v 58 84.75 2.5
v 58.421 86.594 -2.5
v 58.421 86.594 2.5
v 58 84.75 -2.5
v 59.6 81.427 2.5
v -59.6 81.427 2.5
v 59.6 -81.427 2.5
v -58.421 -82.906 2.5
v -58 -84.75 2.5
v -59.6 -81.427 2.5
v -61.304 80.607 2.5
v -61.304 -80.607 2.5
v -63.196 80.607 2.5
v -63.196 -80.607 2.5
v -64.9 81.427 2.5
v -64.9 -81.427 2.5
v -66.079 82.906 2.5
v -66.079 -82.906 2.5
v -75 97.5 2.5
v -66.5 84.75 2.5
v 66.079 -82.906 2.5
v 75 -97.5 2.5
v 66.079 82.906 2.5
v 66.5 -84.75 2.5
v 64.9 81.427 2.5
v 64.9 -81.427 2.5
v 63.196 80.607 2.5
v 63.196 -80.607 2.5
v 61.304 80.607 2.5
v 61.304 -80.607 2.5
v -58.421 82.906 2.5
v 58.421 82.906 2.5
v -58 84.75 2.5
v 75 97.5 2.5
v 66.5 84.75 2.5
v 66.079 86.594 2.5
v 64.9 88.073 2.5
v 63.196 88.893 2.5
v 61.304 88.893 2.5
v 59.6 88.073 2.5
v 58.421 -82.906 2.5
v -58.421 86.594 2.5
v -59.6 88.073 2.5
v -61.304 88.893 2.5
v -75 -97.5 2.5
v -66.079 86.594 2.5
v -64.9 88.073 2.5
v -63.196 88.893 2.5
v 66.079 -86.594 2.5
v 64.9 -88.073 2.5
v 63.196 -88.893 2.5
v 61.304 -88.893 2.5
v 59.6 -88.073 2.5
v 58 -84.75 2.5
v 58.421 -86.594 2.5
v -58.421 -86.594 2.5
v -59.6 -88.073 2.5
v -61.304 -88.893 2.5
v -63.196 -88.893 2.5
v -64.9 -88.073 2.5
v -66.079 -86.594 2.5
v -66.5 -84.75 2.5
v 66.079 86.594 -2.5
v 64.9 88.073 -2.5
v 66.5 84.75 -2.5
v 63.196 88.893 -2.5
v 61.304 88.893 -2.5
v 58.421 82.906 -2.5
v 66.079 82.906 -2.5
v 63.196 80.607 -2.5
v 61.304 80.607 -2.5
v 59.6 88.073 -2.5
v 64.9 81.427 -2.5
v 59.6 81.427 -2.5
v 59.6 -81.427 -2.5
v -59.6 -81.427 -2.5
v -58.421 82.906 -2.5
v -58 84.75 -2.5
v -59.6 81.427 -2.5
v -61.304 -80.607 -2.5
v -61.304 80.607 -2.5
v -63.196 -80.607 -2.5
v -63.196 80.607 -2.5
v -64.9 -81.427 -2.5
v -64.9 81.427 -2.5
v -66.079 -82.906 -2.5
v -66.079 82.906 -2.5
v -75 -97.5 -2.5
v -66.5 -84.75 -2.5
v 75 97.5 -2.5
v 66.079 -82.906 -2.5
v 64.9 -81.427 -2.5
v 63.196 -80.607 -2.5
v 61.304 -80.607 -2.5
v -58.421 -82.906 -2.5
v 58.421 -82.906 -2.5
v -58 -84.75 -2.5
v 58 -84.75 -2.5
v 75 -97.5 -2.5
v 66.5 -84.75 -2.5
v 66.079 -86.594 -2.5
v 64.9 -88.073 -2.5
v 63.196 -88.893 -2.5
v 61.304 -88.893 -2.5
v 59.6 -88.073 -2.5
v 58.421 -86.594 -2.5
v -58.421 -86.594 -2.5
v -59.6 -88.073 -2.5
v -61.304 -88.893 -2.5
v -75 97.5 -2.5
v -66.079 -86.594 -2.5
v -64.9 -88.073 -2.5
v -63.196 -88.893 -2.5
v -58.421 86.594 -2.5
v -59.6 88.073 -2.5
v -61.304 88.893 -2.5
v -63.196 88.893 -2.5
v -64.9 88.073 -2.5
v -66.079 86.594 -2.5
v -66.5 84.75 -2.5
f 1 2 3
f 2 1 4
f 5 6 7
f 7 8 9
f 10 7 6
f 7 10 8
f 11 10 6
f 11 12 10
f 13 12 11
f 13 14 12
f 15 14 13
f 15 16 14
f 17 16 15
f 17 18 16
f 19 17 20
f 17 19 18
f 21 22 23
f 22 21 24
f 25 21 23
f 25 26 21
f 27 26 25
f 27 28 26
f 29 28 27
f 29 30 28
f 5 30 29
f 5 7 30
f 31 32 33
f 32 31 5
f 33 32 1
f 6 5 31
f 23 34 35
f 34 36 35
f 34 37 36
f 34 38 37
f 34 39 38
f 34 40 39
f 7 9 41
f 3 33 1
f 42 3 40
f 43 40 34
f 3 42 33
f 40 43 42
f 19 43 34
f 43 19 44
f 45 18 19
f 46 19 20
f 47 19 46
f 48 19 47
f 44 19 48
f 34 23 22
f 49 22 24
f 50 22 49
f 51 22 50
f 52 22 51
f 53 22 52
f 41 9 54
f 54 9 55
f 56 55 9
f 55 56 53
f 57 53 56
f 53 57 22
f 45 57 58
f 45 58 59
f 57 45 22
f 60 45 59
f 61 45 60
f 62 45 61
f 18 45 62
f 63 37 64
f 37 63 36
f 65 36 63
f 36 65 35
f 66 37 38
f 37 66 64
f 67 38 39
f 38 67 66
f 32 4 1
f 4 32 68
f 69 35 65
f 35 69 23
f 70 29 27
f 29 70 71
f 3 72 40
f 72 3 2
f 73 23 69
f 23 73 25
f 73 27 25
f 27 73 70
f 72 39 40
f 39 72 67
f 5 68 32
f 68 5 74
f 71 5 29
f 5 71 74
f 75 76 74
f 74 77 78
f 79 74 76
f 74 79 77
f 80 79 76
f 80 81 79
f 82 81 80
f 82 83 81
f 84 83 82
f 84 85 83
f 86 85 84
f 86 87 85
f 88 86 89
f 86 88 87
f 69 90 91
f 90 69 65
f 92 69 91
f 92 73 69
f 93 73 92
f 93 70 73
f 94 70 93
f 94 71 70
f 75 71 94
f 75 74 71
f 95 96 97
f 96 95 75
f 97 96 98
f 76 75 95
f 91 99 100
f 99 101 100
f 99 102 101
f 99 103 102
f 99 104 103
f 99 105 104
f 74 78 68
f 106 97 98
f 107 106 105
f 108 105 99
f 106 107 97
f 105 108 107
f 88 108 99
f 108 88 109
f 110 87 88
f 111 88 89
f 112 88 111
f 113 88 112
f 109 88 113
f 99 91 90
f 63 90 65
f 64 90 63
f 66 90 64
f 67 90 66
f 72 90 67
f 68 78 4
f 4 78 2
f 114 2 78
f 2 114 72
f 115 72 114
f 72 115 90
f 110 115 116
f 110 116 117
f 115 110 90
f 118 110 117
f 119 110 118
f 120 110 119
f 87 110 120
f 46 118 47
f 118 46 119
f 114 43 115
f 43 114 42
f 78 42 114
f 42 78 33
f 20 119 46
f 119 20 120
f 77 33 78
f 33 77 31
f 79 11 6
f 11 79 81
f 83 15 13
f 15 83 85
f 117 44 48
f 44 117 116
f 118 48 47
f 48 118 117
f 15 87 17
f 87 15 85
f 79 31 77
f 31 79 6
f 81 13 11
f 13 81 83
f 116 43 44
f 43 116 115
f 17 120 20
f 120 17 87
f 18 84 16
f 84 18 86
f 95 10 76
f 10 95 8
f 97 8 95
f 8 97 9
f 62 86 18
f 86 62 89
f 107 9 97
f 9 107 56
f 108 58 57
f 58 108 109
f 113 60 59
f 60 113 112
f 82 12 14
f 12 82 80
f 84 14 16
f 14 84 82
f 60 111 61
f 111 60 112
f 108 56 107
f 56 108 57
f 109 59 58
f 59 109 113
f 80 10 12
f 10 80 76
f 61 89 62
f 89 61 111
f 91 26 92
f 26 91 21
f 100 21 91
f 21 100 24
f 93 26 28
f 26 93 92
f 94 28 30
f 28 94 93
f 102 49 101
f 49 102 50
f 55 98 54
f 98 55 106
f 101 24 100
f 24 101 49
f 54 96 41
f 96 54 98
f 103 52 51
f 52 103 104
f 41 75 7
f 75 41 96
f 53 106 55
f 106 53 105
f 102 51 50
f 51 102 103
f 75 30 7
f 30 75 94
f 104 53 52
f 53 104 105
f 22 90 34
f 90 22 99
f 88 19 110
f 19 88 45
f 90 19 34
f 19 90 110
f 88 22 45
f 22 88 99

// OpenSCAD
// Generated by SolidPython 1.1.3 on 2024-01-11 20:37:03


difference() {
	cube(center = true, size = [150, 195.0000000000, 5]);
	union() {
		translate(v = [62.2500000000, 84.7500000000]) {
			cylinder(center = true, h = 5, r = 4.2500000000);
		}
		translate(v = [-62.2500000000, 84.7500000000]) {
			cylinder(center = true, h = 5, r = 4.2500000000);
		}
		translate(v = [-62.2500000000, -84.7500000000]) {
			cylinder(center = true, h = 5, r = 4.2500000000);
		}
		translate(v = [62.2500000000, -84.7500000000]) {
			cylinder(center = true, h = 5, r = 4.2500000000);
		}
	}
}
/***********************************************
*********      SolidPython code:      **********
************************************************
 
import solid
import numpy as np
import numbers
import pudb
from solid.utils import *
import viewscad
import subprocess
import os
import os.path as osp
import math
import sys

chamfer_extrude=solid.import_scad("./chamfer_extrude.scad")
chamfer_extrude=chamfer_extrude.chamfer_extrude
r = viewscad.Renderer(width=800, height=800)

def debug(model,f_name,path="/home/ts/code/projects/mfd/designs/debug"):
    solid.scad_render_to_file(model,osp.join(path,f_name)+".scad")
#generate position list of wells using offset from center
wells_pos_from_center_4 = lambda offset: [[-offset,offset],
                                        [offset, offset],
                                        [-offset, -offset],
                                        [offset, -offset]]
wells_pos_from_center_2 = lambda offset: [[offset,0],
                                        [-offset,0]]

def make_well(dims,shape=None,height=None,dxf=False):
    def circle_cylinder():
        if dxf or (height is None):
            well = solid.circle(r=dims, segments=64)
        else:
            well = solid.cylinder(r=dims, h=height, segments=64, center = True)
        return well
    if dims is None:
        sys.exit("radius needs to be a number")
    if isinstance(dims, numbers.Number):
        well =circle_cylinder()
    elif len(dims)==1:
        if isinstance(dims[1], numbers.Number):
            well =circle_cylinder()
        else:
            sys.exit("radius needs to be a number")
    elif len(dims)==2:
        well = solid.square(dims,center = True)
    elif len(dims)==3:
        well = solid.cube(dims, center = True)
    return well

def wells_top_bottom(center_gap,device_dims=None,shape=None,height=None, positions = None, dxf = False,well_shape=None):
    if well_shape == None:
        well_shape = make_well(device_dims,shape=shape,height=height,dxf=dxf)
    wells = []
    if positions is None:
        offset = radius+radius/2.0
        positions = wells_pos_from_center_2(offset)
    if dxf or (height is None):
        height = 0
    for position in positions:
        if dxf:
            wells.append(solid.translate([position[0],position[1]])(well_shape))
        else:
            wells.append(solid.translate([position[0],position[1],height/2.0])(well_shape))
    return  union()(*wells)

#place wells in four corners 
def four_corner(radius,height=None, positions = None, dxf = False):
    #if well pos not specified set
    #to equally spaced by half radius
    if positions is None:
        offset = radius+radius/2.0
        positions = wells_pos_from_center_4(offset)
    if dxf or (height is None):
        height = 0
    #make wells at positions with specified radius and height
    wells = []
    for position in positions:
        #make circle if making dxf
        if dxf:
            well_shape = solid.circle(r=radius, segments=64)
            well_shape = solid.translate([position[0],position[1]])(well_shape)
        #if stl make cylinder
        else:
            well_shape = solid.cylinder(r=radius, h=height, segments=64, center = True)
            well_shape = solid.translate([position[0],position[1],height/2.0])(well_shape)
        wells.append(well_shape)
    return  union()(*wells)

#generate channels 
def make_channels(length,width,height=0,num_chans=1,max_chans=None,spacing=None, dxf = False,
                  rotate_channels=False):
    if dxf or (height is None):
        height = 0
    #if channel gap not defined, is equal to
    if spacing is None: spacing = width
    #calculate number of channels if fitting max num within given width
    if not max_chans is None:
        import math
        num_chans = math.floor((max_chans-spacing)/(width+spacing))
    #get total width of channel section  
    total_width = (width*num_chans)+(spacing*(num_chans-1))

    #make template channel
    #if rotate_channels: width, length = length, width
    if dxf:
        channel_t = solid.square([length,width],center = True)
    else:
        channel_t = solid.cube([length,width,height], center = True)

    #if number channels is even, offset the first channel to center its gap
    if num_chans % 2 == 0: centering = -(width/2.0+spacing/2.0)
    else: centering = 0
    #move template channel up to align bottom at z = 0 
    #and offset center if necessary
    if dxf:
        channel_t = solid.translate([0,centering])(channel_t)
    else:
        channel_t = solid.translate([0,centering,height/2.0])(channel_t)

    #if rotate_channels: length,width = width,length
    #start making the channels
    channels = []
    for i in range(num_chans):
        #if i=0 there is no translation
        #if i=1, we make the first channel adjacent to second
        direction = i

        #if i>=1, we add channels alternating left and right
        if i >= 1:
            direction = -(i/2.0)
            if i % 2 == 1: direction = (-direction)+0.5
                
        #make channel at right position and add it to channel list
        translation_coords = [0,direction*(width+spacing)]
        #if rotate_channels: translation_coords = [direction*(width+spacing),0]
        if dxf:
            channel = solid.translate(translation_coords)(channel_t)
        else:
            channel = solid.translate([*translation_coords,0])(channel_t)
        channels.append(channel)
    
    #group all channels as one object
    channels = union()(*channels)
    #compute the x,y,z dimensions in order to pass as arguments 
    #for construction of other parts of device (such as the chambers)
    measurements = {'x':(length/2.0,-length/2.0),
                    'y':(total_width/2.0,-total_width/2.0)}
    if not dxf:
        measurements['z'] = (height,0)
    if rotate_channels:
        channels = solid.rotate(90)(channels)
        measurements['x'],measurements['y']=measurements['y'],measurements['x']
    return channels,measurements

def make_chambers(msrs,height=None,extra=0,len_until=None,width=None, dxf = False):
    #computes x,y,z length
    total = lambda x : abs(x[0]) + abs(x[1])
    
    #if specific height if specified
    #otherwise use same height as channels
    if dxf:
        pass
    elif not height is None:
        msrs['z'] = (height,0)
    else:
        msrs['z'] = (0,0)
        
    #make copy of measurements from channels to modify chamber dimensions 
    #and add length to chambers as specified
    chamber_dims = msrs.copy()
    #calculate length of chamber to reach specified offset
    if not len_until is None:
        chamber_len = len_until-(msrs['x'][0])
    #or add specified length to channel length (if not specified, adds 0)
    else:
        chamber_len = msrs['x'][0]+extra
    #set the chamber length based 
    chamber_dims['x'] = (chamber_len/2.0,-(chamber_len/2.0))
    #compute final dimensions of chamber
    if not width is None:
        chamber_dims['y'] = (width/2.0,-width/2.0)
    chamber_dims = [total(size) for size in chamber_dims.values()]
        
    #calculate chamber translation offset to place adjacent to channels
    chamber_trslt = msrs['x'][0]+(chamber_len/2.0)
    #compute chamber translation coordinates to align with channels
    #x = 1 moves chamber above channels
    #x = -1 moves chamber below channels
    if dxf:
        trslt = lambda x : [x*(chamber_trslt),0]
    else:
        trslt = lambda x : [x*(chamber_trslt),0,msrs['z'][0]/2.0]
    
    #function to make chamber at top or at bottom 
    if dxf:
        move = lambda x : solid.translate(trslt(x))(solid.square(chamber_dims, center = True) )
    else:
        move = lambda x : solid.translate(trslt(x))(solid.cube(chamber_dims,center = True))
    #make top and bottom chambers and return them as grouped
    top = move(1)
    bottom = move(-1)
    #chambers=solid.rotate(90)(solid.union()(top,bottom))
    chambers=(solid.union()(top,bottom))

    return chambers

#create alignment features 
def alignment_features(unit,dims,grid_size, mask_size = None, alignment = "hollow", units_from_center = (2.5,2.5), corner_len=None):
    width = grid_size[0]*dims[0]
    length = grid_size[1]*dims[1]
    if mask_size is None and corner_len is None:
        corner_len = (dims[0] + dims[1]) /2 / 8
    corner = lambda thickness_div : solid.union()( solid.square([corner_len,corner_len/thickness_div],center=False), solid.square([corner_len/thickness_div,corner_len],center=False) )
    
    def make_full(thickness_div):
        thickness = corner_len/thickness_div
        tr = solid.translate([0, 0, 0 ])(solid.rotate(180)(corner(thickness_div)))
        tr = solid.translate([thickness/2,thickness/2,0])(tr)
        bl = solid.translate([0, 0, 0 ])(solid.rotate(0)(corner(thickness_div)))
        bl = solid.translate([-thickness/2,-thickness/2,0])(bl)
        return solid.union()(tr,bl)
    
    def make_hollow(thickness_div):
        thickness = corner_len/(thickness_div/2)
        inner = make_full(thickness_div)
        outer = make_full(thickness_div/2)
        hollow = outer - inner 
        return hollow
    
    center = (width /2 , length/2)
    mask_pos = lambda x,y : (center[0] + x*(float(units_from_center[0])*dims[0]), center[1] + y*(float(units_from_center[1])*dims[1]))
    positions = []
    positions.append(mask_pos(1,0))
    positions.append(mask_pos(0,1))
    positions.append(mask_pos(-1,0))
    positions.append(mask_pos(0,-1))
    make_mask = lambda mtype : make_hollow(8) if mtype == "hollow" else make_full(8)
    masks = [ solid.translate([*position,0])(make_mask(alignment)) for position in positions]
    
    solid.scad_render_to_file(solid.union()(*masks),"./designs/open_chamber/masks.scad")
    #return unit - solid.union()(*masks)
    return solid.union()(*masks,unit)

def create_outline(thickness, array, dims, grid_size,):
    width = grid_size[0]*dims[0] + thickness *2
    length = grid_size[1]*dims[1] + thickness *2
    outer = solid.translate([-thickness, -thickness,0])(solid.square([width, length]))
    return outer-array

def create_wall(wall_thickness, outline_thickness, dims, grid_size, wall_height = 2000, dxf = False):
    inner_width = grid_size[0]*dims[0] + outline_thickness *2
    inner_length = grid_size[1]*dims[1] + outline_thickness *2
    outer_width = inner_width + wall_thickness * 2
    outer_length = inner_length + wall_thickness * 2
    outer_pos_x = -outline_thickness-wall_thickness
    outer_pos_y = -outline_thickness-wall_thickness
    inner_pos_x = -outline_thickness
    inner_pos_y = -outline_thickness
    if dxf:
        inner_wall = solid.translate([inner_pos_x,
                                      inner_pos_y,
                                      0])(solid.square([inner_width, inner_length]))
        outer_wall = solid.translate([outer_pos_x,
                                      outer_pos_y,
                                      0])(solid.square([outer_width, outer_length]))

        return outer_wall-inner_wall
    else:
        inner_wall = solid.translate([inner_pos_x,
                                      inner_pos_y,
                                      0])(solid.cube([inner_width, inner_length,wall_height]))
        outer_wall = solid.translate([outer_pos_x,
                                      outer_pos_y,
                                      0])(solid.cube([outer_width, outer_length,wall_height]))

        return outer_wall-inner_wall, {'wall_height': wall_height,
                                       'wall_thickness': wall_thickness,
                                       'inner_width':inner_width,
                                       'inner_length': inner_length,
                                       'outer_width': outer_width,
                                       'outer_length': outer_length,
                                       'outer_pos_x' : outer_pos_x,
                                       'outer_pos_y' : outer_pos_y,
                                       'inner_pos_x' : inner_pos_x,
                                       'inner_pos_y' : inner_pos_y}

def create_thicker_wall(wall_thickness, outer_wall_offset, wall_dims, dims, grid_size, height_start = .2, height_end=2, dxf = False):
    addon_wall,thicker_wall_dims = create_wall(wall_thickness, outer_wall_offset, dims, grid_size, wall_height=height_end-height_start, dxf = False)
    addon_wall = solid.translate([0,0,height_start])(addon_wall)

    thicker_wall_dims['wall_height'] = height_end
    thicker_wall_dims['wall_thickness'] = wall_dims['wall_thickness'] + wall_thickness
    return addon_wall, thicker_wall_dims
 
def add_lock_to_wall(wall,wall_dims,y_offset = 0,cut_ratio=0.7,L_length=3, gap_ratio=0.05, axis="x",width_ratio=1/2):
    # Makes L shape
    def make_L(max_length,length_thickness,max_width,width_thickness,height,y_offset):
        length = solid.cube([max_length,length_thickness,height])
        width = solid.cube([width_thickness,max_width,height])
        width = solid.translate([max_length-(width_thickness),0,0])(width)
        L = solid.union()(width,length)
        debug(L,"L")
        if axis == "x":
            L = solid.rotate(-90)(L)
            L = solid.translate([0,max_length,0])(L)
        else:
            L = solid.rotate(-180)(L)
            L = solid.translate([max_length,max_width,0])(L)
        return solid.translate([0,0,y_offset])(L)
    
    lock_length = L_length
    lock_width = wall_dims['wall_thickness']*width_ratio
    lock_length_thickness = lock_width/2
    lock_width_thickness = lock_width/2
    L_lock = make_L(lock_length,lock_length_thickness,lock_width,lock_width_thickness, wall_dims['wall_height']-y_offset, y_offset)
    
    margin_space = lock_length - lock_length*(1-gap_ratio)
    key_length = lock_length-margin_space
    key_length_thickness = lock_length_thickness-(margin_space*2)
    key_width = lock_width-(margin_space*2)
    key_width_thickness = lock_width_thickness-(margin_space*2)
    L_key = make_L(key_length,key_length_thickness,key_width,key_width_thickness, wall_dims['wall_height']-y_offset, y_offset)
    L_key = solid.translate([margin_space,margin_space,0])(L_key)
    L = solid.union()(L_lock,L_key)
    debug(L,"L")
    
    #Make cube to be used as negative to split frame in a half
    #Can choose if making left or right negative, specify ratio of split
    def make_negative(right,cut_ratio):
        if axis == "x":
            if right:
                length = wall_dims['outer_length']*(1-cut_ratio)
                pos_x = wall_dims['outer_pos_x']+(wall_dims['outer_length']*cut_ratio)
            else:
                length = wall_dims['outer_length']*(cut_ratio)
                pos_x = wall_dims['outer_pos_x'] 
            negative = solid.cube([wall_dims['outer_width'],length, wall_dims['wall_height']])
            negative = solid.translate([wall_dims['outer_pos_y'],pos_x,0])(negative)
        else:
            if right:
                length = wall_dims['outer_width']*(1-cut_ratio)
                pos_x = wall_dims['outer_pos_y']+(wall_dims['outer_width']*cut_ratio)
            else:
                length = wall_dims['outer_width']*(cut_ratio)
                pos_x = wall_dims['outer_pos_y'] 
            negative = solid.cube([length,wall_dims['outer_length'], wall_dims['wall_height']])
            negative = solid.translate([pos_x,wall_dims['outer_pos_x'],0])(negative)
        return negative, pos_x, length 
                      
    #Make negatives
    negative_right, right_half_pos_x, right_half_length = make_negative(True,cut_ratio)
    negative_left, left_half_pos_x, right_half_length = make_negative(False,cut_ratio)
    #Make halves
    left_half = solid.difference()(wall,negative_right)
    right_half = solid.difference()(wall,negative_left)
    def place_L(L, L_length,L_width):
        #Place L on top wall       
        offset_to_center = (wall_dims['wall_thickness']-L_width)/2
        if axis == "x":
            y_pos_top = (wall_dims['outer_pos_y'] +
                    wall_dims['outer_width'] - 
                    L_width - offset_to_center)
            top_L = solid.translate([y_pos_top,
                                     right_half_pos_x-(L_length),
                                     0])(L)
            #Place L on bottom wall       
            y_pos_bottom = wall_dims['outer_pos_y']+offset_to_center
            bottom_L = solid.translate([y_pos_bottom,
                                        right_half_pos_x-L_length,
                                        0])(L)
        else:
            y_pos_top = (wall_dims['outer_pos_x'] +
                    wall_dims['outer_length'] -
                    (L_width+offset_to_center))
            top_L = solid.translate([right_half_pos_x-L_length,
                                     y_pos_top,
                                     0])(L)
            #Place L on bottom wall       
            y_pos_bottom = wall_dims['outer_pos_y']+offset_to_center
            bottom_L = solid.translate([right_half_pos_x-L_length,
                                        y_pos_bottom,
                                        0])(L)
        return bottom_L, top_L
    #Make complimentary L pieces through union and differences
    #Make Lock
    bottom_L_lock, top_L_lock = place_L(L_lock,L_length,lock_width)
    left_half = solid.difference()(left_half,bottom_L_lock)
    left_half = solid.difference()(left_half,top_L_lock)
    #Make Key
    bottom_L_key, top_L_key = place_L(L_key,L_length,lock_width)
    right_half = solid.union()(right_half,bottom_L_key)
    right_half = solid.union()(right_half,top_L_key)
    return left_half, right_half


#build a row x col grid of containment units
def make_unit_array(unit,dims,grid_size, dxf = False, alignment = None, mask_size = None,
                    units_from_center = None,alignment_offset=None, alignment_mark_size=1):
    units = []
    for col in range(grid_size[1]):
        for row in range(grid_size[0]):
            if dxf:
                units.append(solid.translate([row*dims[0],col*dims[1]])(unit))
            else:
                units.append(solid.translate([row*dims[0],col*dims[1],dims[2]/2.0])(unit))
    array = solid.union()(*units)
    if (not alignment is None) and dxf:
        if not alignment_offset is None:
            array = solid.translate([alignment_offset[0],alignment_offset[1]])(array)
        array = alignment_features(array,dims, grid_size, alignment = alignment, mask_size = None, units_from_center = units_from_center,corner_len=alignment_mark_size)
        if not alignment_offset is None:
            array = solid.translate([-alignment_offset[0],-alignment_offset[1]])(array)
    return array


def make_taylor(wells_pos = wells_pos_from_center_4(2.25), well_rad = 1.5 ,
                well_height = 2, chan_w = 0.01, chan_l = 1, chan_h = 0.010 ,
                chan_gap = 0.040, max_chans = None,num_chans=100, chamber_height  = 0.100,
                columns = 1, rows = 1, chamber_len_until=2.25, add_channels = True, add_wells = True, 
                add_chambers = True, save_path = "./", alignment = None, units_from_center = 2,
                mask_size = None, render_stl = False, outline_thickness = 0.050, dxf = True,
                wall_height = 15, wall_thickness = 0.95, casing_x=9, casing_y=9, casing_z=0,rotate_units=0):

    dims = [casing_x, casing_y, casing_z]
    wells = four_corner(well_rad,well_height, dxf = dxf, positions = wells_pos)
    debug(wells,"wells")
    channels, msrs = make_channels(chan_l,chan_w,chan_h,dxf=dxf, spacing = chan_gap, max_chans=max_chans,num_chans=num_chans)
    debug(channels,"channels")
    chambers = make_chambers(msrs,dxf = dxf, height=chamber_height,len_until=chamber_len_until)
    debug(chambers,"chambers")

    #add together and render
    device_parts = []
    if add_channels:
        device_parts.append(channels)
    if add_wells:
        device_parts.append(wells)
    if add_chambers:
        device_parts.append(chambers)
    device=union()(*device_parts)
    device = rotate(rotate_units)(device)

    device=solid.translate([dims[0]/2.0,dims[1]/2.0,0])(device)
    channels = rotate(rotate_units)(channels)
    channels=solid.translate([dims[0]/2,dims[1]/2,0])(channels)
    chambers_wells = union()(wells,chambers)
    chambers_wells = rotate(rotate_units)(chambers_wells)
    chambers_wells=solid.translate([dims[0]/2,dims[1]/2,0])(chambers_wells)

    file_name = str(rows)+'x'+str(columns)+'_units_'
    grid_size = [rows,columns]

    if alignment:
        alignment="full"
    device = make_unit_array(device,dims,grid_size, dxf=dxf, alignment = alignment,
                                 units_from_center = units_from_center)
    channels = make_unit_array(channels,dims,grid_size, dxf=dxf, alignment = alignment,
                                 units_from_center = units_from_center)
    if alignment=="full":
        alignment="hollow"

    chambers_wells = make_unit_array(chambers_wells,dims,grid_size, dxf=dxf, alignment = alignment,
                                 units_from_center =units_from_center)

    def save_model(model,prefix):
        model_fname = os.path.abspath(save_path+prefix+"_"+file_name+".scad")
        solid.scad_render_to_file(model,model_fname)
        return model_fname

    wells_fname = save_model(wells,"wells")
    channels_fname = save_model(channels,"channels")
    device_fname = save_model(device,"device")
    chambers_wells_fname = save_model(chambers_wells,"chambers_wells")
    return (chambers_wells,chambers_wells_fname), (channels,channels_fname), (device,device_fname)

def make_device(design='open',rows=8,columns=6,wells_pos = 4.5,well_offset=3.2, well_rad=3.2,well_height=0.1,
                chan_l=1,chan_w=0.01,chan_h=0.01,chan_gap=0.015,num_chans=101,dxf=True,save_path="./designs/open_chamber/",
                casing_x=9.0,casing_y=18.0,casing_z=0,rotate_units=90,units_from_center=(3,1),chamber_len_until=4.5,
                chamber_width=None,alignment=True, add_wells=True, add_channels=True,add_chambers=True,well_shape=None):

    dims = [casing_x, casing_y, casing_z]
    if design == "open":
        wells_pos=wells_pos_from_center_2(wells_pos)
        wells = wells_top_bottom(well_offset*2,device_dims=well_rad,height=well_height, dxf = dxf, positions = wells_pos,well_shape=well_shape)
    elif design == "closed":
        wells_pos=wells_pos_from_center_4(wells_pos)
        debug(wells,"wells")
        wells = four_corner(well_offset,well_height,device_dims=well_rad, dxf = dxf, positions = wells_pos)
    else:
        print(design+" is not a valid design.\n Choose valid design: 'open' or 'closed'")
        exit()
    wells = rotate(rotate_units)(wells)
    wells=solid.translate([dims[0]/2,dims[1]/2,0])(wells)
    debug(wells,"wells")

    channels, msrs = make_channels(chan_l,chan_w,chan_h,dxf=dxf, spacing = chan_gap, num_chans=num_chans,rotate_channels=False)
    channels = rotate(rotate_units)(channels)
    channels=solid.translate([dims[0]/2,dims[1]/2,0])(channels)

    chambers=make_chambers(msrs,height=None,extra=0,len_until=chamber_len_until, width=chamber_width,dxf = dxf)
    chambers = rotate(rotate_units)(chambers)
    chambers=solid.translate([dims[0]/2,dims[1]/2,0])(chambers)

    device_parts = []
    if add_channels:
        device_parts.append(channels)
    if add_wells:
        device_parts.append(wells)
    if add_chambers:
        device_parts.append(chambers)
    device = union()(*device_parts)
    #device = rotate(rotate_units)(device)
    #device=solid.translate([dims[0]/2.0,dims[1]/2.0,0])(device)

    chambers_wells = []
    if add_chambers:
        chambers_wells.append(chambers)
    if add_wells:
        chambers_wells.append(wells)
    chambers_wells = union()(*chambers_wells)
    #chambers_wells = union()(wells,chambers)
    #chambers_wells = rotate(rotate_units)(chambers_wells)
    #chambers_wells=solid.translate([dims[0]/2,dims[1]/2,0])(chambers_wells)

    file_name = str(rows)+'x'+str(columns)+'_units_'

    grid_size = [rows,columns]
    if alignment:
        alignment="full"
    device = make_unit_array(device,dims,grid_size, dxf=dxf, alignment = alignment,
                                 units_from_center = units_from_center)
    channels = make_unit_array(channels,dims,grid_size, dxf=dxf, alignment = alignment,
                                 units_from_center = units_from_center)
    if alignment=="full":
        alignment="hollow"

    chambers_wells = make_unit_array(chambers_wells,dims,grid_size, dxf=dxf, alignment = alignment,
                                 units_from_center =units_from_center)

    def save_model(model,prefix):
        model_fname = os.path.abspath(save_path+prefix+"_"+file_name+".scad")
        solid.scad_render_to_file(model,model_fname)
        return model_fname

    wells_fname = save_model(wells,"wells")
    channels_fname = save_model(channels,"channels")
    device_fname = save_model(device,"device")
    chambers_wells_fname = save_model(chambers_wells,"chambers_wells")
    return (chambers_wells,chambers_wells_fname), (channels,channels_fname), (device,device_fname)


def make_open_chamber(rows=8,columns=6,wells_pos = wells_pos_from_center_2(4.5), well_rad=3.2,well_height=0.1,
                      chan_l=1,chan_w=0.01,chan_h=0.01,chan_gap=0.015,num_chans=101,dxf=True,save_path="./designs/open_chamber/",
                      casing_x=9.0,casing_y=18.0,casing_z=0,rotate_units=90,units_from_center=(3,1),chamber_len_until=4.5,
                      chamber_width=None,alignment=True, add_wells=True, add_channels=True,add_chambers=True,well_shape=None):

    dims = [casing_x, casing_y, casing_z]
    wells = wells_top_bottom(well_rad,height=well_height, dxf = dxf, positions = wells_pos, well_shape=well_shape)
    channels, msrs = make_channels(chan_l,chan_w,chan_h,dxf=dxf, spacing = chan_gap, num_chans=num_chans,rotate_channels=False)
    chambers=make_chambers(msrs,height=None,extra=0,len_until=chamber_len_until, width=chamber_width,dxf = dxf)
    debug(chambers,"chambers")
    device_parts = []
    if add_channels:
        device_parts.append(channels)
    if add_wells:
        device_parts.append(wells)
    if add_chambers:
        device_parts.append(chambers)
    device = union()(*device_parts)
    device = rotate(rotate_units)(device)
    device=solid.translate([dims[0]/2.0,dims[1]/2.0,0])(device)
    channels = rotate(rotate_units)(channels)
    channels=solid.translate([dims[0]/2,dims[1]/2,0])(channels)
    chambers_wells = union()(wells,chambers)
    chambers_wells = rotate(rotate_units)(chambers_wells)
    chambers_wells=solid.translate([dims[0]/2,dims[1]/2,0])(chambers_wells)

    file_name = str(rows)+'x'+str(columns)+'_units_'

    grid_size = [rows,columns]
    if alignment:
        alignment="full"
    device = make_unit_array(device,dims,grid_size, dxf=dxf, alignment = alignment,
                                 units_from_center = units_from_center)
    channels = make_unit_array(channels,dims,grid_size, dxf=dxf, alignment = alignment,
                                 units_from_center = units_from_center)
    if alignment=="full":
        alignment="hollow"

    chambers_wells = make_unit_array(chambers_wells,dims,grid_size, dxf=dxf, alignment = alignment,
                                 units_from_center =units_from_center)

    def save_model(model,prefix):
        model_fname = os.path.abspath(save_path+prefix+"_"+file_name+".scad")
        solid.scad_render_to_file(model,model_fname)
        return model_fname

    wells_fname = save_model(wells,"wells")
    channels_fname = save_model(channels,"channels")
    device_fname = save_model(device,"device")
    chambers_wells_fname = save_model(chambers_wells,"chambers_wells")
    return (chambers_wells,chambers_wells_fname), (channels,channels_fname), (device,device_fname)

def to_dxf(scad_path):
    dxf_path = scad_path.replace(".scad",".dxf")
    subprocess.call(["openscad", "-o", dxf_path, scad_path])
    import ezdxf
    temp_dxf = ezdxf.readfile(dxf_path)
    temp_dxf.saveas(dxf_path)

#def make_walls(diameter,thickness,grid_size,dims,height=20,segments=256,make_inner=True):
#    wafer_wall_out = solid.cylinder(r=diameter/2,h=height, segments=segments)
#    wafer_wall_in = solid.cylinder(r=(diameter/2-thickness),h=height, segments=segments)
#    wafer_wall = solid.difference()(wafer_wall_out,wafer_wall_in)
#    wafer_wall = solid.translate([grid_size[1]*dims[1]/2.0,grid_size[0]*dims[0]/2.0])(wafer_wall)
#
#    vertical_wall_length = grid_size[1]*dims[1]
#    horizontal_wall_length = grid_size[0]*dims[0]
#    vertical_wall = solid.cube([vertical_wall_length,thickness,height],center = True)
#    vertical_wall = solid.translate([vertical_wall_length/2,0,height/2])(vertical_wall)
#    horizontal_wall = solid.cube([thickness,horizontal_wall_length,height],center = True)
#    horizontal_wall = solid.translate([0,vertical_wall_length/2,height/2])(horizontal_wall)
#    walls = []
#    walls.append(horizontal_wall)
#    walls.append(vertical_wall)
#    for col in range(grid_size[1]):
#        if col == grid_size[1]-1: 
#            walls.append(solid.translate([0,(col+1)*dims[1]])(vertical_wall))
#        elif col > 0 and col < grid_size[1]-1 and make_inner==True:
#            walls.append(solid.translate([0,(col+1)*dims[1]])(vertical_wall))
#    for row in range(grid_size[0]):
#        if row == grid_size[0]-1: 
#            walls.append(solid.translate([(row+1)*dims[0],0])(horizontal_wall))
#        elif row > 0 and row < grid_size[0]-1 and make_inner==True:
#            walls.append(solid.translate([(row+1)*dims[0],0])(horizontal_wall))
#    walls = union()(*walls)
#    wafer_walls = union()(walls,wafer_wall)
#    return walls,wafer_wall,wafer_walls

def make_walls(diameter,thickness,grid_size,dims,height=20,segments=256,make_inner=True,padx=0,pady=0):
    wafer_wall_out = solid.cylinder(r=diameter/2,h=height, segments=segments)
    wafer_wall_in = solid.cylinder(r=(diameter/2-thickness),h=height, segments=segments)
    wafer_wall = solid.difference()(wafer_wall_out,wafer_wall_in)
    wafer_wall = solid.translate([grid_size[1]*dims[1]/2.0,grid_size[0]*dims[0]/2.0])(wafer_wall)

    vertical_wall_length = grid_size[0]*dims[0]+padx
    horizontal_wall_length = grid_size[1]*dims[1]+pady
    vertical_wall = solid.cube([vertical_wall_length,thickness,height],center = True)
    vertical_wall = solid.translate([vertical_wall_length/2-pady/2,-padx/2,height/2])(vertical_wall)
    horizontal_wall = solid.cube([thickness,horizontal_wall_length,height],center = True)
    horizontal_wall = solid.translate([-pady/2,horizontal_wall_length/2-padx/2,height/2])(horizontal_wall)
    walls = []
    walls.append(horizontal_wall)
    walls.append(vertical_wall)
    for col in range(grid_size[1]):
        if col == grid_size[1]-1: 
            walls.append(solid.translate([0,(col+1)*dims[1]+pady])(vertical_wall))
        elif col > 0 and col < grid_size[1]-1 and make_inner==True:
            walls.append(solid.translate([0,(col+1)*dims[1]])(vertical_wall))
    for row in range(grid_size[0]):
        if row == grid_size[0]-1: 
            walls.append(solid.translate([(row+1)*dims[0]+padx,0])(horizontal_wall))
        elif row > 0 and row < grid_size[0]-1 and make_inner==True:
            walls.append(solid.translate([(row+1)*dims[0],0])(horizontal_wall))
    walls = union()(*walls)
    wafer_walls = union()(walls,wafer_wall)
    return walls,wafer_wall,wafer_walls

def save_model(model,base_path,base_name,dxf=True):
    if not os.path.exists(base_path):
        os.makedirs(base_path)
    dxf_path=osp.join(base_path,base_name+".scad")
    solid.scad_render_to_file(model,osp.join(dxf_path))
    if dxf:
        to_dxf(dxf_path)

def make_wafer(diameter,flat_len,thickness):
    wafer = solid.cylinder(r1=diameter/2,r2=diameter/2,h=thickness,segments=512,)()
    x_start_flat=(flat_len/2)
    y_start_flat = math.sqrt(((diameter/2)**2) - (x_start_flat**2) )
    height_delete_flat=diameter/2-y_start_flat
    flat_delete = solid.cube([flat_len,height_delete_flat,thickness],center=False)()
    flat_delete = solid.translate([-flat_len/2,y_start_flat,0])(flat_delete)
    wafer = solid.difference()(wafer,flat_delete)
    wafer = solid.rotate(90)(wafer)
    return wafer

def add_wafer_to_mask(wafer_size,flat_len,mask,grid_size,dims,wafer_line_thickness=0.1,outer_mask_thickness=5,alignment_offset=None):
    def make_wafer_mask(wafer_size,flat_len):
        wafer_mask = make_wafer(wafer_size,flat_len,1)
        wafer_mask = solid.projection()(wafer_mask)
        wafer_mask = solid.translate([grid_size[0]*dims[0]/2.0,grid_size[1]*dims[1]/2.0])(wafer_mask)
        if not alignment_offset is None:
            wafer_mask = solid.translate([-alignment_offset[0],-alignment_offset[1]])(wafer_mask)
        return wafer_mask

    inner_wafer_line_mask = make_wafer_mask(wafer_size-wafer_line_thickness/2,flat_len)
    outer_wafer_line_mask = make_wafer_mask(wafer_size+wafer_line_thickness/2,flat_len)
    outer_wafer_mask = make_wafer_mask(wafer_size+outer_mask_thickness,flat_len)
    outer_wafer_mask = solid.difference()(outer_wafer_mask,outer_wafer_line_mask)
    wafer_mask = solid.union()(outer_wafer_mask,inner_wafer_line_mask)

    return solid.difference()(wafer_mask,mask)

def make_posts(post_shape,post_height):
    posts = solid.linear_extrude(height=post_height)(post_shape)
    return posts

def make_wafer_empty(diameter,flat_len,thickness,margin,notch_len=20,notch_height=5,oversize=1.01):
    diameter*=oversize
    flat_len*=oversize
    wafer = make_wafer(diameter,flat_len,thickness)
    holder = solid.cylinder(r1=diameter/2+margin,r2=diameter/2+margin,h=thickness,segments=512)()
    holder = solid.difference()(holder,wafer)

    x_start_flat=(flat_len/2)
    y_start_flat = math.sqrt(((diameter/2)**2) - (x_start_flat**2) )
    height_delete_flat=diameter/2-y_start_flat
    notch = solid.cube([notch_len,notch_height,thickness],center=False)()
    notch = solid.translate([-notch_len/2,y_start_flat,0])(notch)
    notch = solid.rotate(90)(notch)
    return solid.difference()(holder,notch)

def wafer_print_calibration(diameter,thickness,height,z_offset):
    circles = []
    radii = []
    radii.append(diameter/2.0*0.8)
    radii.append(diameter/2.0*0.6)
    radii.append(diameter/2.0*0.4)
    radii.append(diameter/2.0*0.2)
    for radius in radii:
        inner = solid.cylinder(r1=radius-(thickness/2.0),r2=radius-(thickness/2.0),h=thickness,segments=512,)()
        outer = solid.cylinder(r1=radius+(thickness/2.0),r2=radius+(thickness/2.0),h=thickness,segments=512,)()
        diff = solid.difference()(outer,inner)
        circles.append(diff)
    circles = solid.union()(*circles)
    circles = solid.translate([0,0,z_offset])(circles)
    return circles

def make_rack(wells,dims,grid_size,alignment_offset,rack_x,rack_y,rack_thickness,bolt_width,add_bolts=True):

    #get X and Y dimensions of gride of pipette tips
    X_len = dims[0]*grid_size[0]
    Y_len = dims[1]*grid_size[1]
    #make rack
    rack = solid.cube([rack_x,rack_y,rack_thickness],center=True)

    if add_bolts:
    #add bolt holes
        bolt_hole=solid.cylinder(r=bolt_width/2,h=rack_thickness,center=True)()
        bolt_holes = []
        bolt_holes.append(solid.translate([rack_x/2-1.5*bolt_width,rack_y/2-1.5*bolt_width])(bolt_hole))
        bolt_holes.append(solid.translate([-rack_x/2+1.5*bolt_width,rack_y/2-1.5*bolt_width])(bolt_hole))
        bolt_holes.append(solid.translate([-rack_x/2+1.5*bolt_width,-rack_y/2+1.5*bolt_width])(bolt_hole))
        bolt_holes.append(solid.translate([rack_x/2-1.5*bolt_width,-rack_y/2+1.5*bolt_width])(bolt_hole))
        bolt_holes = solid.union()(*bolt_holes)
        rack=solid.difference()(rack,bolt_holes)
    rack_support = rack

    #center rack with pipette holes
    rack = solid.translate([0,0,rack_thickness/2])(rack)
    rack = solid.translate([X_len/2,Y_len/2])(rack)
    rack = solid.translate([-alignment_offset[0],-alignment_offset[1]])(rack)
    wells = solid.linear_extrude(height=rack_thickness)(wells)
    rack = solid.difference()(rack,wells)
    return rack, rack_support

def make_pillar(wells,dims,grid_size,alignment_offset,rack_x,rack_y,pillar_height,rack_thickness,bolt_width,add_bolts=True,taper_angle=1,bolt_position_corner=1.5):

    #get X and Y dimensions of gride of pipette tips
    X_len = dims[0]*grid_size[0]
    Y_len = dims[1]*grid_size[1]
    #make rack
    rack = solid.cube([rack_x,rack_y,rack_thickness],center=True)
    
    if add_bolts:
    #add bolt holes
        bolt_hole=solid.cylinder(r=bolt_width/2,h=rack_thickness,center=True)()
        bolt_holes = []
        bolt_holes.append(solid.translate([rack_x/2-bolt_position_corner*bolt_width,rack_y/2-bolt_position_corner*bolt_width])(bolt_hole))
        bolt_holes.append(solid.translate([-rack_x/2+bolt_position_corner*bolt_width,rack_y/2-bolt_position_corner*bolt_width])(bolt_hole))
        bolt_holes.append(solid.translate([-rack_x/2+bolt_position_corner*bolt_width,-rack_y/2+bolt_position_corner*bolt_width])(bolt_hole))
        bolt_holes.append(solid.translate([rack_x/2-bolt_position_corner*bolt_width,-rack_y/2+bolt_position_corner*bolt_width])(bolt_hole))
        bolt_holes = solid.union()(*bolt_holes)
        rack=solid.difference()(rack,bolt_holes)
    rack_support = rack

    #center rack with pipette holes
    #rack = solid.translate([0,0,-rack_thickness])(rack)
    rack = solid.translate([X_len/2,Y_len/2])(rack)
    rack = solid.translate([-alignment_offset[0],-alignment_offset[1]])(rack)
    if not taper_angle == 0:
        wells=chamfer_extrude(pillar_height,taper_angle,segments=20)(wells)
    else:
        wells = solid.linear_extrude(height=pillar_height)(wells)
    rack = solid.union()(rack,wells)
    return rack, rack_support

def deg_taper_len(height,deg):
    if not deg == 0:
        return height*math.tan(math.radians(deg))
    else:
        return 0

def make_outline(inner_dims,wall_thickness,grid_size,dims,alignment_offset):
    inner_dims=np.array(inner_dims)
    inner_outline=solid.square(inner_dims,center=True)
    outer_dims=inner_dims+wall_thickness
    outer_outline=solid.square(outer_dims,center=True)
    outline=solid.difference()(outer_outline,inner_outline)
    outline=solid.translate([grid_size[0]*dims[0]/2.0,grid_size[1]*dims[1]/2.0])(outline)
    return outline








 
 
************************************************/
